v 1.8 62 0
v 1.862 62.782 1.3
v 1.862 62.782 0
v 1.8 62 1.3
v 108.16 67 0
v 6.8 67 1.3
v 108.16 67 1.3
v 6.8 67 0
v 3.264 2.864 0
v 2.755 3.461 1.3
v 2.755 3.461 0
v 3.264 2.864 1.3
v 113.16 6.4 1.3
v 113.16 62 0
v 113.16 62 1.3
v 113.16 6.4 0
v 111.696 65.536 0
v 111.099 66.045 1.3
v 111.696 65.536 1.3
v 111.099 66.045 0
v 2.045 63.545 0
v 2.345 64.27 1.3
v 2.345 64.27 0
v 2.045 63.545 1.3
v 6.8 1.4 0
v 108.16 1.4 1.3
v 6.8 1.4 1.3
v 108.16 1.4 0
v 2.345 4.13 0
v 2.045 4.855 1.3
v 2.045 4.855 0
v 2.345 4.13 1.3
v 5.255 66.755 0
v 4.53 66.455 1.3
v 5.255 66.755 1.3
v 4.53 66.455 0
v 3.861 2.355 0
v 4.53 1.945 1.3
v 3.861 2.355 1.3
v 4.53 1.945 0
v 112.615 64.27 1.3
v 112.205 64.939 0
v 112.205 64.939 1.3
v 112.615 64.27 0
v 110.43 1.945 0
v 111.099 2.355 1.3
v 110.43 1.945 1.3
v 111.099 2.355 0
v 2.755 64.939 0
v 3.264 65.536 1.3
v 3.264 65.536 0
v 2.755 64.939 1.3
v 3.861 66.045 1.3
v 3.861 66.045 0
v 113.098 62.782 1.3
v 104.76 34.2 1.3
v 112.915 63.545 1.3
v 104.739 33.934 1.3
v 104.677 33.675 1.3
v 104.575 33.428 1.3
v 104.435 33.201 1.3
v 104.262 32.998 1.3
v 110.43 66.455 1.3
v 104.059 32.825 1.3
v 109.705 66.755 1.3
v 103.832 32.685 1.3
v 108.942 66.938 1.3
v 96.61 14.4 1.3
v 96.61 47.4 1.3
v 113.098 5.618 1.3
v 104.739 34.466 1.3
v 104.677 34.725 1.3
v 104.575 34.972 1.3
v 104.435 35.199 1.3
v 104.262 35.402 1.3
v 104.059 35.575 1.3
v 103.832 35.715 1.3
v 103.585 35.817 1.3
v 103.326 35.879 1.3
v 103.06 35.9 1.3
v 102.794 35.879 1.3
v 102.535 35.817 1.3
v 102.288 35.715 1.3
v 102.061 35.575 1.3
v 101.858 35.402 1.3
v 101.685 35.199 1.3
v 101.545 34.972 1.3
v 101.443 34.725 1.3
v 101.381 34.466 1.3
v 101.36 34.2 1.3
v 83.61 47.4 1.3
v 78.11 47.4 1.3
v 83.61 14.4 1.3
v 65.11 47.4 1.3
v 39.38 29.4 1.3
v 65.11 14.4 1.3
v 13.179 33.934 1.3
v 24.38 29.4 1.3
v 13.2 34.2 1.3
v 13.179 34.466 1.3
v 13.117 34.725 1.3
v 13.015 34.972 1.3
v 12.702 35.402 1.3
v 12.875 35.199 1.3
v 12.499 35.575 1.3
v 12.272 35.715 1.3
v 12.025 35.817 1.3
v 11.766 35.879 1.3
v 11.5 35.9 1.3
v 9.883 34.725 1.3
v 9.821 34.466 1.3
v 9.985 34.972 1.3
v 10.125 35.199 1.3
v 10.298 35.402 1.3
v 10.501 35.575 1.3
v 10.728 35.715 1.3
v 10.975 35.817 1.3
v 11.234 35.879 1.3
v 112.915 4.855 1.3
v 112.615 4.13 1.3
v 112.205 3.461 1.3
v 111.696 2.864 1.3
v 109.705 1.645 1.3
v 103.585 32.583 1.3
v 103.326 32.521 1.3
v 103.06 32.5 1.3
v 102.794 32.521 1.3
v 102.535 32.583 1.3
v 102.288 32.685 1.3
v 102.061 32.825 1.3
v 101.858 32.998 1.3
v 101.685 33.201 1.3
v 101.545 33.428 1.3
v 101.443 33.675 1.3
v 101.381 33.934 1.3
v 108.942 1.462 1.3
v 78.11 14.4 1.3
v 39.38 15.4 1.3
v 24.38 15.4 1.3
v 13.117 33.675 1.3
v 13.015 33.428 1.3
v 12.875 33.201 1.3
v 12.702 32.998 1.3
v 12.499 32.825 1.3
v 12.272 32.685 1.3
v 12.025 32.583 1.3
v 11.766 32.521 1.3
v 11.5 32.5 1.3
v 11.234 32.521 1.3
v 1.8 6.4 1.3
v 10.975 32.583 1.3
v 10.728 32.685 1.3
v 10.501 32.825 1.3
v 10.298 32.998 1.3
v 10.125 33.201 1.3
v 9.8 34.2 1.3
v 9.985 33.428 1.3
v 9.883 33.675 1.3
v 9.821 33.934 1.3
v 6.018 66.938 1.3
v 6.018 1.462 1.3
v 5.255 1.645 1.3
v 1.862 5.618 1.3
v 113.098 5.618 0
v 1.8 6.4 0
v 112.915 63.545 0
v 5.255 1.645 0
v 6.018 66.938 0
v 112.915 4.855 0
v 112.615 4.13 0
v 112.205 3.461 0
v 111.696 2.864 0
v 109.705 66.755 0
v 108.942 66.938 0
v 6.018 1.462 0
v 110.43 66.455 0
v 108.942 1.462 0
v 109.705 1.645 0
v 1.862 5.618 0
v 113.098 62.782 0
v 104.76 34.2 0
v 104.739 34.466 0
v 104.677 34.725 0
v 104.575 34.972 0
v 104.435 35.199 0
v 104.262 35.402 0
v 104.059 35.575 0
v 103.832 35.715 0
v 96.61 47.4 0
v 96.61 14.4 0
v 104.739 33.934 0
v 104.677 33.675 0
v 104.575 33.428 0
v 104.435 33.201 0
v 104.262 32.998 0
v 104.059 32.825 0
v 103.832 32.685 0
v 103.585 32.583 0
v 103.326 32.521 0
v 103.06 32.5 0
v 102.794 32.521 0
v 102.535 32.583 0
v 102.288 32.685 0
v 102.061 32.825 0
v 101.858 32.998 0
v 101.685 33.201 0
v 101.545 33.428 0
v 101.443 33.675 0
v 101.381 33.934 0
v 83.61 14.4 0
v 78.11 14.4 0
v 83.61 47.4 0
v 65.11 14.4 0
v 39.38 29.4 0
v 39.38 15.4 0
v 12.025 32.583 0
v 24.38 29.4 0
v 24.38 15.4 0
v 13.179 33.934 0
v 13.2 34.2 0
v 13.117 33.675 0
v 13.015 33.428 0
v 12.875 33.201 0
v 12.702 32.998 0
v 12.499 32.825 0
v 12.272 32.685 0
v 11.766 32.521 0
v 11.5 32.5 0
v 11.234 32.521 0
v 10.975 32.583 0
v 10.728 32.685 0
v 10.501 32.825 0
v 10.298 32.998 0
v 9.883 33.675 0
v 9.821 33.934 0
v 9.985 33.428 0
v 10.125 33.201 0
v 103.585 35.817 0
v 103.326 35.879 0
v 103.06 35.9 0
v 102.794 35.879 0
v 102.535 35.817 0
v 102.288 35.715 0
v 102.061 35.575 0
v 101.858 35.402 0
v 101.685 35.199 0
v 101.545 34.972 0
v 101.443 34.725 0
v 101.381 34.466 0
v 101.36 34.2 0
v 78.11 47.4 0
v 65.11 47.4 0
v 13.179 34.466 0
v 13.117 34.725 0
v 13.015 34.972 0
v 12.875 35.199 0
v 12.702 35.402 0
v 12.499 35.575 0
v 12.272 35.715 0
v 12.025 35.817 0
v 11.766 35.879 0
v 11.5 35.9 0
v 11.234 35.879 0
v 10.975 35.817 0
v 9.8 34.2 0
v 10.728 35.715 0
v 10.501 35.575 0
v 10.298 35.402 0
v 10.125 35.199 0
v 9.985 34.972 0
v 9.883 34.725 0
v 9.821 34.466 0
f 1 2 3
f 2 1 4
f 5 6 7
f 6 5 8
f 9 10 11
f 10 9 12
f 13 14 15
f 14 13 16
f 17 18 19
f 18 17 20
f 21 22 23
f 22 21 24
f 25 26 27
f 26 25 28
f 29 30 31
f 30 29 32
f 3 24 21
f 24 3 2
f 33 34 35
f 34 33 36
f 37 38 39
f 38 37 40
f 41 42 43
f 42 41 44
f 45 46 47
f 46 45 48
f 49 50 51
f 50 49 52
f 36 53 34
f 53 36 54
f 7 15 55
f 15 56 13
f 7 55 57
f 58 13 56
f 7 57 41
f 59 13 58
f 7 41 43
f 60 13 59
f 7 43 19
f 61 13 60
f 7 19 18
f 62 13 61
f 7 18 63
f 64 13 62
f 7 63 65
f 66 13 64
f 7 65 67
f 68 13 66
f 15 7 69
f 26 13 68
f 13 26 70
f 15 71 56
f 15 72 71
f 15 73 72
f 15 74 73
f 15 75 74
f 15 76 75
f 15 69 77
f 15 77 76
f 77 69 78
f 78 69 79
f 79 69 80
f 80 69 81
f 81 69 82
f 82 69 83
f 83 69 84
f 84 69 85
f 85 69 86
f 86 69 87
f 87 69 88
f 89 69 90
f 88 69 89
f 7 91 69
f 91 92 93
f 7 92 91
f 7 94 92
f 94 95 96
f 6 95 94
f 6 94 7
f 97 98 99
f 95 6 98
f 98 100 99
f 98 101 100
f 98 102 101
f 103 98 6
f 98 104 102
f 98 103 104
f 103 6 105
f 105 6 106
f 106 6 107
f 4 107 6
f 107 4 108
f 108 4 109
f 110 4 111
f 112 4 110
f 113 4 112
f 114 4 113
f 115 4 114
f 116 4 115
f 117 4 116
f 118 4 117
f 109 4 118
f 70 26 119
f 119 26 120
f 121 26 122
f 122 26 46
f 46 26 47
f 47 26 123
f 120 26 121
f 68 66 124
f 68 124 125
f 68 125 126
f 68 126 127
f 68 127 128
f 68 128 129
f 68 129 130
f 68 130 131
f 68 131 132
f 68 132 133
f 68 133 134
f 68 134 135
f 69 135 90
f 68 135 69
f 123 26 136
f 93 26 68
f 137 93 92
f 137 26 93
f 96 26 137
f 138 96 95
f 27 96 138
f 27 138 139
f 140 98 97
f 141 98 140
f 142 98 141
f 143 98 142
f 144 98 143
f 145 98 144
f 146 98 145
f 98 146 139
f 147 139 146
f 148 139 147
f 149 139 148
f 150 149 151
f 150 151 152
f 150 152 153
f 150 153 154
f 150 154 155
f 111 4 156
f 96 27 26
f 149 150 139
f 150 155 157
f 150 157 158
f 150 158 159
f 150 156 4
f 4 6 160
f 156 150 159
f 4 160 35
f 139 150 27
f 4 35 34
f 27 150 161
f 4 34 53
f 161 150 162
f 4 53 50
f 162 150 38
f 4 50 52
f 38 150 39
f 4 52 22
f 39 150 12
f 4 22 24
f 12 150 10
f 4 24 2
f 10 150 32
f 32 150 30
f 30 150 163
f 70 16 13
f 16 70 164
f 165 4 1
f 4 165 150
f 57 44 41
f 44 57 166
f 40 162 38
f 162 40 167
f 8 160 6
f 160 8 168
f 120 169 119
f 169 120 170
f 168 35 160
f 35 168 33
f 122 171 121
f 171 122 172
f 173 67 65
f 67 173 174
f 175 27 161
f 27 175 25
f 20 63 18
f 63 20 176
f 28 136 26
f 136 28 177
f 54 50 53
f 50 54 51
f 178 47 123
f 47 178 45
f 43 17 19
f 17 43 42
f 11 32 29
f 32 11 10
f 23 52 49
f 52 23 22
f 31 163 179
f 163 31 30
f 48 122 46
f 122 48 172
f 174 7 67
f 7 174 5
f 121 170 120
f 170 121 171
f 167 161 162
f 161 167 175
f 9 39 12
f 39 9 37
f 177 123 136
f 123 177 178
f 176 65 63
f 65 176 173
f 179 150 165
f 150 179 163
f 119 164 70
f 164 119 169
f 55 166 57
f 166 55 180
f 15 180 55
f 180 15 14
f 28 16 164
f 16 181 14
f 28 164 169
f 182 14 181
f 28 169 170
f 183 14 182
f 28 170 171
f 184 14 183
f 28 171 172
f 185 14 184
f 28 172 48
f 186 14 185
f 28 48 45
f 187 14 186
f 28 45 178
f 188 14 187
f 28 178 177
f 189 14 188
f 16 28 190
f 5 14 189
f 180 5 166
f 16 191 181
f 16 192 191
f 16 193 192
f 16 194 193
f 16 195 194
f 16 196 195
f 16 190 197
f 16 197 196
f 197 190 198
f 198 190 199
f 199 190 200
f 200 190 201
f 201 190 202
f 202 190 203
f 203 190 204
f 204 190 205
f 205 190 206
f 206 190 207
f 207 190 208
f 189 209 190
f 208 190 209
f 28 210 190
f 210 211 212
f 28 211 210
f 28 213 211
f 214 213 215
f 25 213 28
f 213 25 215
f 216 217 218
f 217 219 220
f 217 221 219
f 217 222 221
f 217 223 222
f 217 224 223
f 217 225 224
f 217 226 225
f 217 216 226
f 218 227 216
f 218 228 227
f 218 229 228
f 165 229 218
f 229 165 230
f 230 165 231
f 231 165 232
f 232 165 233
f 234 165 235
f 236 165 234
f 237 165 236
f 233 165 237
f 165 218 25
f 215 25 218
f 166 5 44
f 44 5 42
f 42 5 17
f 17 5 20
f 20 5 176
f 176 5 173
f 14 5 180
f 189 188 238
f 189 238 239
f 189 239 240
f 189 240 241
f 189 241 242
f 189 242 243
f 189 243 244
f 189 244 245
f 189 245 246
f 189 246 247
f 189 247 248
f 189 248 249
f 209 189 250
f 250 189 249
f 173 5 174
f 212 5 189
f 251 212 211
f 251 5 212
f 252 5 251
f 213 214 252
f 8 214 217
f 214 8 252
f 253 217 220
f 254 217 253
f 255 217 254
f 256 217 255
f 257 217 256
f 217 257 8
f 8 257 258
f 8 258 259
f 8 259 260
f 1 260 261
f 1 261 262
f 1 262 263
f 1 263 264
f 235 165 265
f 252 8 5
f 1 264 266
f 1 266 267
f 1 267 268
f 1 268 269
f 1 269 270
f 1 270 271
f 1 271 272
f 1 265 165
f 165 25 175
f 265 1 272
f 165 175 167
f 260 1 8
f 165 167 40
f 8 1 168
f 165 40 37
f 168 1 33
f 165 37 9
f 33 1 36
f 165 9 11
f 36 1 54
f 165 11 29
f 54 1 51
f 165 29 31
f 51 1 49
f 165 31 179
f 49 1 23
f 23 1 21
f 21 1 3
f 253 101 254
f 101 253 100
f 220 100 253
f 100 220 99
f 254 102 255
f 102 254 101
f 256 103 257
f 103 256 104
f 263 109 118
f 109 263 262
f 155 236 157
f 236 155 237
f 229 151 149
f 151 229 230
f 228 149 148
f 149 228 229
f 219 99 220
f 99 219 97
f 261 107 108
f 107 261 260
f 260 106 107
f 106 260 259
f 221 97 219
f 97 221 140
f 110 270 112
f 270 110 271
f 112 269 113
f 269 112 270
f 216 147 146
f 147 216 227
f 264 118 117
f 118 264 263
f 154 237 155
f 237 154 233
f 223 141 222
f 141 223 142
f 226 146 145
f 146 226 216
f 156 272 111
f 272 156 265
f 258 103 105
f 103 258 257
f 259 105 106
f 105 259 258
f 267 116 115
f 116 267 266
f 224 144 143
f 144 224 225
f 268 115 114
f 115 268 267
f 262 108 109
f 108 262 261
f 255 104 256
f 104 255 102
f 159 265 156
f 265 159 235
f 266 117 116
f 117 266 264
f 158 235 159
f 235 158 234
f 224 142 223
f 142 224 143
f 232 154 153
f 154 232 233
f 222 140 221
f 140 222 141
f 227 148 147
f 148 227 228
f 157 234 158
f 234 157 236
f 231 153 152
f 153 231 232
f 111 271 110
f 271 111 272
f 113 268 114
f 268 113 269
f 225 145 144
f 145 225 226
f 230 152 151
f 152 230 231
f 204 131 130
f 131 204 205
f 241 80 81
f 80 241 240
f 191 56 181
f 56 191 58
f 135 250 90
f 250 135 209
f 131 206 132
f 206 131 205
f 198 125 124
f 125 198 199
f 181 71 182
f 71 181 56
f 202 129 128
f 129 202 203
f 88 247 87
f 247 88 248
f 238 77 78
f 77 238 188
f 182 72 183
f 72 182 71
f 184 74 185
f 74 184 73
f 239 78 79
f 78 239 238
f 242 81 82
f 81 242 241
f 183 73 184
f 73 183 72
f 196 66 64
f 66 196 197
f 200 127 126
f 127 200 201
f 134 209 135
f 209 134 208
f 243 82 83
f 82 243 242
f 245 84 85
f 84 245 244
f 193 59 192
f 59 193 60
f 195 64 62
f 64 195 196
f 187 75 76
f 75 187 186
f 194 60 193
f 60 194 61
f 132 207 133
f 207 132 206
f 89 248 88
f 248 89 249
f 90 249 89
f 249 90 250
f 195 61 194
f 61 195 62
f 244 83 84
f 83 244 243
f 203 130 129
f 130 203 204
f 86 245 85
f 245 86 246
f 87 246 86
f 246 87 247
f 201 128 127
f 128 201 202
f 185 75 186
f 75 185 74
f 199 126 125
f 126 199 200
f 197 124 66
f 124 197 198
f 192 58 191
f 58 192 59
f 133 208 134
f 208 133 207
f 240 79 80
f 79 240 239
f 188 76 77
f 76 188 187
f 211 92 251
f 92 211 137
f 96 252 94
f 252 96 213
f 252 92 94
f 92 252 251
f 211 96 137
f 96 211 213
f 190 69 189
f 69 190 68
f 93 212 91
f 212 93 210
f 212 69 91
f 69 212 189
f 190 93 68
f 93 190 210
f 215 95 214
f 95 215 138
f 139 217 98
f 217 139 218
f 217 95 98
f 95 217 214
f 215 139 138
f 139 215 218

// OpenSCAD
// file: AWSBOX01A_O01.scad
include <../configuration.scad>


module I2CDIFF01A(){
  
 I2CDIFF01A_sirka_kon=15; //sirka konektoru
 I2CDIFF01A_vyska_kon=14; //vyska konektoru
 I2CDIFF01A_sirka_mod_otvory=4; //kolik modul zabira der
 I2CDIFF01A_vyska_nad_plbase=7; //jak je vzdálen konektor nad plbase    
      
      
   translate([vzdalenost_der*(I2CDIFF01A_sirka_mod_otvory-1)/2,I2CDIFF01A_vyska_nad_plbase+I2CDIFF01A_vyska_kon/2,D02_sila_materialu/2])
   cube(size = [I2CDIFF01A_sirka_kon,I2CDIFF01A_vyska_kon,D02_sila_materialu+0.4], center = true);  
    
}
      

module RJ12_2x2(){
  
 I2CDIFF01A_sirka_kon=13; //sirka konektoru
 I2CDIFF01A_vyska_kon=33; //vyska konektoru
 I2CDIFF01A_sirka_mod_otvory=6; //kolik modul zabira der
 I2CDIFF01A_vyska_nad_plbase=6; //jak je vzdálen konektor nad plbase    
  
//parametry s držáku rj12    
 RJ12_sire_konektoru=15;     
  RJ12_rozestup_mezi_konektory=3.5;  

    
    
   translate([vzdalenost_der/2+(RJ12_rozestup_mezi_konektory+RJ12_sire_konektoru)/2,I2CDIFF01A_vyska_nad_plbase+I2CDIFF01A_vyska_kon/2,D02_sila_materialu/2])
   cube(size = [I2CDIFF01A_sirka_kon,I2CDIFF01A_vyska_kon,D02_sila_materialu+0.4], center = true);  
    
     translate([vzdalenost_der/2+(RJ12_rozestup_mezi_konektory+RJ12_sire_konektoru)*3/2,I2CDIFF01A_vyska_nad_plbase+I2CDIFF01A_vyska_kon/2,D02_sila_materialu/2])
   cube(size = [I2CDIFF01A_sirka_kon,I2CDIFF01A_vyska_kon,D02_sila_materialu+0.4], center = true);
    
}
// file: AWSBOX01A_D03.scad
include <../configuration.scad>
AWSBOX01A_D03();
module AWSBOX01A_D03(){
difference () {

translate([D02_sila_materialu+3/2*D02_dolerance_na_zasunuti+radidus_hrany,D02_sila_materialu+radidus_hrany+D02_dolerance_na_zasunuti/2,0])
minkowski()
    {
	cube([(pocet_der1-1)*vzdalenost_der+2*vzdalenost_od_okraje-2*radidus_hrany-D02_dolerance_na_zasunuti,D02_vyska_boxu_pod_plbase+D02_vyska_boxu_nad_plbase-D02_dolerance_na_zasunuti,D02_sila_materialu]);          // base plastics brick
        cylinder(r=radidus_hrany,h=0.1);
    }
    
    
    
    //drzáky spodního krytu

translate([0,(D02_vyska_boxu_pod_plbase+D02_vyska_boxu_nad_plbase+2*D02_sila_materialu+2*radidus_hrany)/2-(prumer_sroubu+3*D02_sila_materialu)/2,-0.01])

translate([drzak_sroubu_hloubka-prumer_sroubu/2-1.5*D02_sila_materialu,(prumer_sroubu+3*D02_sila_materialu)/2,-0.001])
     cylinder(h=3*drzak_sroubu_vyska, r=prumer_sroubu/2, center=false);


translate([(pocet_der1-1)*vzdalenost_der+2*vzdalenost_od_okraje+2*D02_sila_materialu+D02_dolerance_na_zasunuti,(D02_vyska_boxu_pod_plbase+D02_vyska_boxu_nad_plbase+2*D02_sila_materialu+2*radidus_hrany)/2+(prumer_sroubu+3*D02_sila_materialu)/2,-0.01])
 rotate([0,0,180])

translate([drzak_sroubu_hloubka-prumer_sroubu/2-1.5*D02_sila_materialu,(prumer_sroubu+3*D02_sila_materialu)/2,-0.001])
     cylinder(h=3*drzak_sroubu_vyska, r=prumer_sroubu/2, center=false);
    
    
      }
  }    
      
 
// file: ../configuration.scad
$fn=40; // model faces resolution.

//OBECNE PARAMETRY 
//----------------------------------------------------------------
//----------------------------------------------------------------

//pro PLBASE
pocet_der1=11; //x
pocet_der2=6; //ovlivňuje výšku krabičky
radidus_hrany=5;
vzdalenost_der=10.16;
vzdalenost_od_okraje=vzdalenost_der/2;
prumer_sroubu=3.4;
tloustka_plbase=2;
prekryti_der=-2;

//WINDGAUGE02A_D02 //uchyt na sloup
D02_sila_materialu=5;
D02_vyska_uchytky=40;
D02_prumer_obruby=27; //3/4 trubka
D02_delka_celeho_uchytu=60;
D02_dotahova_vzdalenost=1.5;
D02_prumer_uchytneho_sroubu=4.2;
D02_sirka_matky=9.2; //pro M4
D02_vyska_matky=3;




D02_vyska_boxu_pod_plbase=6;
D02_vyska_boxu_nad_plbase=50;
D02_zapusteni_spodniho_krytu=10;
D02_sila_materialu=1.2;
D02_dolerance_na_zasunuti=0.4; //tolerance je pro obě strany

drzak_sroubu_hloubka=15;
drzak_sroubu_vyska=10;
matka_vyska=3;
// main file
include <../configuration.scad>
use <AWSBOX01A_D03.scad>
use <AWSBOX01A_O01.scad>

AWSBOX01A_D04();

module AWSBOX01A_D04(){
    
    
    difference () {
        AWSBOX01A_D03();
    //posuv na střed první díry v ose X a na ose y na hranu plbase vrchní
translate([vzdalenost_od_okraje+D02_sila_materialu+D02_dolerance_na_zasunuti/2,D02_sila_materialu+D02_vyska_boxu_pod_plbase+(tloustka_plbase+D02_dolerance_na_zasunuti)/2,0])
    {
    
        //nastavení posunu otvoru v násobcích děr
        translate([vzdalenost_der*1,0,0])
        I2CDIFF01A();
        
        //nastavení posunu otvoru v násobcích děr
        translate([vzdalenost_der*(1+4),0,0])
        
        RJ12_2x2();
    }



    
    
    }
    
       }
       
       
       
       
